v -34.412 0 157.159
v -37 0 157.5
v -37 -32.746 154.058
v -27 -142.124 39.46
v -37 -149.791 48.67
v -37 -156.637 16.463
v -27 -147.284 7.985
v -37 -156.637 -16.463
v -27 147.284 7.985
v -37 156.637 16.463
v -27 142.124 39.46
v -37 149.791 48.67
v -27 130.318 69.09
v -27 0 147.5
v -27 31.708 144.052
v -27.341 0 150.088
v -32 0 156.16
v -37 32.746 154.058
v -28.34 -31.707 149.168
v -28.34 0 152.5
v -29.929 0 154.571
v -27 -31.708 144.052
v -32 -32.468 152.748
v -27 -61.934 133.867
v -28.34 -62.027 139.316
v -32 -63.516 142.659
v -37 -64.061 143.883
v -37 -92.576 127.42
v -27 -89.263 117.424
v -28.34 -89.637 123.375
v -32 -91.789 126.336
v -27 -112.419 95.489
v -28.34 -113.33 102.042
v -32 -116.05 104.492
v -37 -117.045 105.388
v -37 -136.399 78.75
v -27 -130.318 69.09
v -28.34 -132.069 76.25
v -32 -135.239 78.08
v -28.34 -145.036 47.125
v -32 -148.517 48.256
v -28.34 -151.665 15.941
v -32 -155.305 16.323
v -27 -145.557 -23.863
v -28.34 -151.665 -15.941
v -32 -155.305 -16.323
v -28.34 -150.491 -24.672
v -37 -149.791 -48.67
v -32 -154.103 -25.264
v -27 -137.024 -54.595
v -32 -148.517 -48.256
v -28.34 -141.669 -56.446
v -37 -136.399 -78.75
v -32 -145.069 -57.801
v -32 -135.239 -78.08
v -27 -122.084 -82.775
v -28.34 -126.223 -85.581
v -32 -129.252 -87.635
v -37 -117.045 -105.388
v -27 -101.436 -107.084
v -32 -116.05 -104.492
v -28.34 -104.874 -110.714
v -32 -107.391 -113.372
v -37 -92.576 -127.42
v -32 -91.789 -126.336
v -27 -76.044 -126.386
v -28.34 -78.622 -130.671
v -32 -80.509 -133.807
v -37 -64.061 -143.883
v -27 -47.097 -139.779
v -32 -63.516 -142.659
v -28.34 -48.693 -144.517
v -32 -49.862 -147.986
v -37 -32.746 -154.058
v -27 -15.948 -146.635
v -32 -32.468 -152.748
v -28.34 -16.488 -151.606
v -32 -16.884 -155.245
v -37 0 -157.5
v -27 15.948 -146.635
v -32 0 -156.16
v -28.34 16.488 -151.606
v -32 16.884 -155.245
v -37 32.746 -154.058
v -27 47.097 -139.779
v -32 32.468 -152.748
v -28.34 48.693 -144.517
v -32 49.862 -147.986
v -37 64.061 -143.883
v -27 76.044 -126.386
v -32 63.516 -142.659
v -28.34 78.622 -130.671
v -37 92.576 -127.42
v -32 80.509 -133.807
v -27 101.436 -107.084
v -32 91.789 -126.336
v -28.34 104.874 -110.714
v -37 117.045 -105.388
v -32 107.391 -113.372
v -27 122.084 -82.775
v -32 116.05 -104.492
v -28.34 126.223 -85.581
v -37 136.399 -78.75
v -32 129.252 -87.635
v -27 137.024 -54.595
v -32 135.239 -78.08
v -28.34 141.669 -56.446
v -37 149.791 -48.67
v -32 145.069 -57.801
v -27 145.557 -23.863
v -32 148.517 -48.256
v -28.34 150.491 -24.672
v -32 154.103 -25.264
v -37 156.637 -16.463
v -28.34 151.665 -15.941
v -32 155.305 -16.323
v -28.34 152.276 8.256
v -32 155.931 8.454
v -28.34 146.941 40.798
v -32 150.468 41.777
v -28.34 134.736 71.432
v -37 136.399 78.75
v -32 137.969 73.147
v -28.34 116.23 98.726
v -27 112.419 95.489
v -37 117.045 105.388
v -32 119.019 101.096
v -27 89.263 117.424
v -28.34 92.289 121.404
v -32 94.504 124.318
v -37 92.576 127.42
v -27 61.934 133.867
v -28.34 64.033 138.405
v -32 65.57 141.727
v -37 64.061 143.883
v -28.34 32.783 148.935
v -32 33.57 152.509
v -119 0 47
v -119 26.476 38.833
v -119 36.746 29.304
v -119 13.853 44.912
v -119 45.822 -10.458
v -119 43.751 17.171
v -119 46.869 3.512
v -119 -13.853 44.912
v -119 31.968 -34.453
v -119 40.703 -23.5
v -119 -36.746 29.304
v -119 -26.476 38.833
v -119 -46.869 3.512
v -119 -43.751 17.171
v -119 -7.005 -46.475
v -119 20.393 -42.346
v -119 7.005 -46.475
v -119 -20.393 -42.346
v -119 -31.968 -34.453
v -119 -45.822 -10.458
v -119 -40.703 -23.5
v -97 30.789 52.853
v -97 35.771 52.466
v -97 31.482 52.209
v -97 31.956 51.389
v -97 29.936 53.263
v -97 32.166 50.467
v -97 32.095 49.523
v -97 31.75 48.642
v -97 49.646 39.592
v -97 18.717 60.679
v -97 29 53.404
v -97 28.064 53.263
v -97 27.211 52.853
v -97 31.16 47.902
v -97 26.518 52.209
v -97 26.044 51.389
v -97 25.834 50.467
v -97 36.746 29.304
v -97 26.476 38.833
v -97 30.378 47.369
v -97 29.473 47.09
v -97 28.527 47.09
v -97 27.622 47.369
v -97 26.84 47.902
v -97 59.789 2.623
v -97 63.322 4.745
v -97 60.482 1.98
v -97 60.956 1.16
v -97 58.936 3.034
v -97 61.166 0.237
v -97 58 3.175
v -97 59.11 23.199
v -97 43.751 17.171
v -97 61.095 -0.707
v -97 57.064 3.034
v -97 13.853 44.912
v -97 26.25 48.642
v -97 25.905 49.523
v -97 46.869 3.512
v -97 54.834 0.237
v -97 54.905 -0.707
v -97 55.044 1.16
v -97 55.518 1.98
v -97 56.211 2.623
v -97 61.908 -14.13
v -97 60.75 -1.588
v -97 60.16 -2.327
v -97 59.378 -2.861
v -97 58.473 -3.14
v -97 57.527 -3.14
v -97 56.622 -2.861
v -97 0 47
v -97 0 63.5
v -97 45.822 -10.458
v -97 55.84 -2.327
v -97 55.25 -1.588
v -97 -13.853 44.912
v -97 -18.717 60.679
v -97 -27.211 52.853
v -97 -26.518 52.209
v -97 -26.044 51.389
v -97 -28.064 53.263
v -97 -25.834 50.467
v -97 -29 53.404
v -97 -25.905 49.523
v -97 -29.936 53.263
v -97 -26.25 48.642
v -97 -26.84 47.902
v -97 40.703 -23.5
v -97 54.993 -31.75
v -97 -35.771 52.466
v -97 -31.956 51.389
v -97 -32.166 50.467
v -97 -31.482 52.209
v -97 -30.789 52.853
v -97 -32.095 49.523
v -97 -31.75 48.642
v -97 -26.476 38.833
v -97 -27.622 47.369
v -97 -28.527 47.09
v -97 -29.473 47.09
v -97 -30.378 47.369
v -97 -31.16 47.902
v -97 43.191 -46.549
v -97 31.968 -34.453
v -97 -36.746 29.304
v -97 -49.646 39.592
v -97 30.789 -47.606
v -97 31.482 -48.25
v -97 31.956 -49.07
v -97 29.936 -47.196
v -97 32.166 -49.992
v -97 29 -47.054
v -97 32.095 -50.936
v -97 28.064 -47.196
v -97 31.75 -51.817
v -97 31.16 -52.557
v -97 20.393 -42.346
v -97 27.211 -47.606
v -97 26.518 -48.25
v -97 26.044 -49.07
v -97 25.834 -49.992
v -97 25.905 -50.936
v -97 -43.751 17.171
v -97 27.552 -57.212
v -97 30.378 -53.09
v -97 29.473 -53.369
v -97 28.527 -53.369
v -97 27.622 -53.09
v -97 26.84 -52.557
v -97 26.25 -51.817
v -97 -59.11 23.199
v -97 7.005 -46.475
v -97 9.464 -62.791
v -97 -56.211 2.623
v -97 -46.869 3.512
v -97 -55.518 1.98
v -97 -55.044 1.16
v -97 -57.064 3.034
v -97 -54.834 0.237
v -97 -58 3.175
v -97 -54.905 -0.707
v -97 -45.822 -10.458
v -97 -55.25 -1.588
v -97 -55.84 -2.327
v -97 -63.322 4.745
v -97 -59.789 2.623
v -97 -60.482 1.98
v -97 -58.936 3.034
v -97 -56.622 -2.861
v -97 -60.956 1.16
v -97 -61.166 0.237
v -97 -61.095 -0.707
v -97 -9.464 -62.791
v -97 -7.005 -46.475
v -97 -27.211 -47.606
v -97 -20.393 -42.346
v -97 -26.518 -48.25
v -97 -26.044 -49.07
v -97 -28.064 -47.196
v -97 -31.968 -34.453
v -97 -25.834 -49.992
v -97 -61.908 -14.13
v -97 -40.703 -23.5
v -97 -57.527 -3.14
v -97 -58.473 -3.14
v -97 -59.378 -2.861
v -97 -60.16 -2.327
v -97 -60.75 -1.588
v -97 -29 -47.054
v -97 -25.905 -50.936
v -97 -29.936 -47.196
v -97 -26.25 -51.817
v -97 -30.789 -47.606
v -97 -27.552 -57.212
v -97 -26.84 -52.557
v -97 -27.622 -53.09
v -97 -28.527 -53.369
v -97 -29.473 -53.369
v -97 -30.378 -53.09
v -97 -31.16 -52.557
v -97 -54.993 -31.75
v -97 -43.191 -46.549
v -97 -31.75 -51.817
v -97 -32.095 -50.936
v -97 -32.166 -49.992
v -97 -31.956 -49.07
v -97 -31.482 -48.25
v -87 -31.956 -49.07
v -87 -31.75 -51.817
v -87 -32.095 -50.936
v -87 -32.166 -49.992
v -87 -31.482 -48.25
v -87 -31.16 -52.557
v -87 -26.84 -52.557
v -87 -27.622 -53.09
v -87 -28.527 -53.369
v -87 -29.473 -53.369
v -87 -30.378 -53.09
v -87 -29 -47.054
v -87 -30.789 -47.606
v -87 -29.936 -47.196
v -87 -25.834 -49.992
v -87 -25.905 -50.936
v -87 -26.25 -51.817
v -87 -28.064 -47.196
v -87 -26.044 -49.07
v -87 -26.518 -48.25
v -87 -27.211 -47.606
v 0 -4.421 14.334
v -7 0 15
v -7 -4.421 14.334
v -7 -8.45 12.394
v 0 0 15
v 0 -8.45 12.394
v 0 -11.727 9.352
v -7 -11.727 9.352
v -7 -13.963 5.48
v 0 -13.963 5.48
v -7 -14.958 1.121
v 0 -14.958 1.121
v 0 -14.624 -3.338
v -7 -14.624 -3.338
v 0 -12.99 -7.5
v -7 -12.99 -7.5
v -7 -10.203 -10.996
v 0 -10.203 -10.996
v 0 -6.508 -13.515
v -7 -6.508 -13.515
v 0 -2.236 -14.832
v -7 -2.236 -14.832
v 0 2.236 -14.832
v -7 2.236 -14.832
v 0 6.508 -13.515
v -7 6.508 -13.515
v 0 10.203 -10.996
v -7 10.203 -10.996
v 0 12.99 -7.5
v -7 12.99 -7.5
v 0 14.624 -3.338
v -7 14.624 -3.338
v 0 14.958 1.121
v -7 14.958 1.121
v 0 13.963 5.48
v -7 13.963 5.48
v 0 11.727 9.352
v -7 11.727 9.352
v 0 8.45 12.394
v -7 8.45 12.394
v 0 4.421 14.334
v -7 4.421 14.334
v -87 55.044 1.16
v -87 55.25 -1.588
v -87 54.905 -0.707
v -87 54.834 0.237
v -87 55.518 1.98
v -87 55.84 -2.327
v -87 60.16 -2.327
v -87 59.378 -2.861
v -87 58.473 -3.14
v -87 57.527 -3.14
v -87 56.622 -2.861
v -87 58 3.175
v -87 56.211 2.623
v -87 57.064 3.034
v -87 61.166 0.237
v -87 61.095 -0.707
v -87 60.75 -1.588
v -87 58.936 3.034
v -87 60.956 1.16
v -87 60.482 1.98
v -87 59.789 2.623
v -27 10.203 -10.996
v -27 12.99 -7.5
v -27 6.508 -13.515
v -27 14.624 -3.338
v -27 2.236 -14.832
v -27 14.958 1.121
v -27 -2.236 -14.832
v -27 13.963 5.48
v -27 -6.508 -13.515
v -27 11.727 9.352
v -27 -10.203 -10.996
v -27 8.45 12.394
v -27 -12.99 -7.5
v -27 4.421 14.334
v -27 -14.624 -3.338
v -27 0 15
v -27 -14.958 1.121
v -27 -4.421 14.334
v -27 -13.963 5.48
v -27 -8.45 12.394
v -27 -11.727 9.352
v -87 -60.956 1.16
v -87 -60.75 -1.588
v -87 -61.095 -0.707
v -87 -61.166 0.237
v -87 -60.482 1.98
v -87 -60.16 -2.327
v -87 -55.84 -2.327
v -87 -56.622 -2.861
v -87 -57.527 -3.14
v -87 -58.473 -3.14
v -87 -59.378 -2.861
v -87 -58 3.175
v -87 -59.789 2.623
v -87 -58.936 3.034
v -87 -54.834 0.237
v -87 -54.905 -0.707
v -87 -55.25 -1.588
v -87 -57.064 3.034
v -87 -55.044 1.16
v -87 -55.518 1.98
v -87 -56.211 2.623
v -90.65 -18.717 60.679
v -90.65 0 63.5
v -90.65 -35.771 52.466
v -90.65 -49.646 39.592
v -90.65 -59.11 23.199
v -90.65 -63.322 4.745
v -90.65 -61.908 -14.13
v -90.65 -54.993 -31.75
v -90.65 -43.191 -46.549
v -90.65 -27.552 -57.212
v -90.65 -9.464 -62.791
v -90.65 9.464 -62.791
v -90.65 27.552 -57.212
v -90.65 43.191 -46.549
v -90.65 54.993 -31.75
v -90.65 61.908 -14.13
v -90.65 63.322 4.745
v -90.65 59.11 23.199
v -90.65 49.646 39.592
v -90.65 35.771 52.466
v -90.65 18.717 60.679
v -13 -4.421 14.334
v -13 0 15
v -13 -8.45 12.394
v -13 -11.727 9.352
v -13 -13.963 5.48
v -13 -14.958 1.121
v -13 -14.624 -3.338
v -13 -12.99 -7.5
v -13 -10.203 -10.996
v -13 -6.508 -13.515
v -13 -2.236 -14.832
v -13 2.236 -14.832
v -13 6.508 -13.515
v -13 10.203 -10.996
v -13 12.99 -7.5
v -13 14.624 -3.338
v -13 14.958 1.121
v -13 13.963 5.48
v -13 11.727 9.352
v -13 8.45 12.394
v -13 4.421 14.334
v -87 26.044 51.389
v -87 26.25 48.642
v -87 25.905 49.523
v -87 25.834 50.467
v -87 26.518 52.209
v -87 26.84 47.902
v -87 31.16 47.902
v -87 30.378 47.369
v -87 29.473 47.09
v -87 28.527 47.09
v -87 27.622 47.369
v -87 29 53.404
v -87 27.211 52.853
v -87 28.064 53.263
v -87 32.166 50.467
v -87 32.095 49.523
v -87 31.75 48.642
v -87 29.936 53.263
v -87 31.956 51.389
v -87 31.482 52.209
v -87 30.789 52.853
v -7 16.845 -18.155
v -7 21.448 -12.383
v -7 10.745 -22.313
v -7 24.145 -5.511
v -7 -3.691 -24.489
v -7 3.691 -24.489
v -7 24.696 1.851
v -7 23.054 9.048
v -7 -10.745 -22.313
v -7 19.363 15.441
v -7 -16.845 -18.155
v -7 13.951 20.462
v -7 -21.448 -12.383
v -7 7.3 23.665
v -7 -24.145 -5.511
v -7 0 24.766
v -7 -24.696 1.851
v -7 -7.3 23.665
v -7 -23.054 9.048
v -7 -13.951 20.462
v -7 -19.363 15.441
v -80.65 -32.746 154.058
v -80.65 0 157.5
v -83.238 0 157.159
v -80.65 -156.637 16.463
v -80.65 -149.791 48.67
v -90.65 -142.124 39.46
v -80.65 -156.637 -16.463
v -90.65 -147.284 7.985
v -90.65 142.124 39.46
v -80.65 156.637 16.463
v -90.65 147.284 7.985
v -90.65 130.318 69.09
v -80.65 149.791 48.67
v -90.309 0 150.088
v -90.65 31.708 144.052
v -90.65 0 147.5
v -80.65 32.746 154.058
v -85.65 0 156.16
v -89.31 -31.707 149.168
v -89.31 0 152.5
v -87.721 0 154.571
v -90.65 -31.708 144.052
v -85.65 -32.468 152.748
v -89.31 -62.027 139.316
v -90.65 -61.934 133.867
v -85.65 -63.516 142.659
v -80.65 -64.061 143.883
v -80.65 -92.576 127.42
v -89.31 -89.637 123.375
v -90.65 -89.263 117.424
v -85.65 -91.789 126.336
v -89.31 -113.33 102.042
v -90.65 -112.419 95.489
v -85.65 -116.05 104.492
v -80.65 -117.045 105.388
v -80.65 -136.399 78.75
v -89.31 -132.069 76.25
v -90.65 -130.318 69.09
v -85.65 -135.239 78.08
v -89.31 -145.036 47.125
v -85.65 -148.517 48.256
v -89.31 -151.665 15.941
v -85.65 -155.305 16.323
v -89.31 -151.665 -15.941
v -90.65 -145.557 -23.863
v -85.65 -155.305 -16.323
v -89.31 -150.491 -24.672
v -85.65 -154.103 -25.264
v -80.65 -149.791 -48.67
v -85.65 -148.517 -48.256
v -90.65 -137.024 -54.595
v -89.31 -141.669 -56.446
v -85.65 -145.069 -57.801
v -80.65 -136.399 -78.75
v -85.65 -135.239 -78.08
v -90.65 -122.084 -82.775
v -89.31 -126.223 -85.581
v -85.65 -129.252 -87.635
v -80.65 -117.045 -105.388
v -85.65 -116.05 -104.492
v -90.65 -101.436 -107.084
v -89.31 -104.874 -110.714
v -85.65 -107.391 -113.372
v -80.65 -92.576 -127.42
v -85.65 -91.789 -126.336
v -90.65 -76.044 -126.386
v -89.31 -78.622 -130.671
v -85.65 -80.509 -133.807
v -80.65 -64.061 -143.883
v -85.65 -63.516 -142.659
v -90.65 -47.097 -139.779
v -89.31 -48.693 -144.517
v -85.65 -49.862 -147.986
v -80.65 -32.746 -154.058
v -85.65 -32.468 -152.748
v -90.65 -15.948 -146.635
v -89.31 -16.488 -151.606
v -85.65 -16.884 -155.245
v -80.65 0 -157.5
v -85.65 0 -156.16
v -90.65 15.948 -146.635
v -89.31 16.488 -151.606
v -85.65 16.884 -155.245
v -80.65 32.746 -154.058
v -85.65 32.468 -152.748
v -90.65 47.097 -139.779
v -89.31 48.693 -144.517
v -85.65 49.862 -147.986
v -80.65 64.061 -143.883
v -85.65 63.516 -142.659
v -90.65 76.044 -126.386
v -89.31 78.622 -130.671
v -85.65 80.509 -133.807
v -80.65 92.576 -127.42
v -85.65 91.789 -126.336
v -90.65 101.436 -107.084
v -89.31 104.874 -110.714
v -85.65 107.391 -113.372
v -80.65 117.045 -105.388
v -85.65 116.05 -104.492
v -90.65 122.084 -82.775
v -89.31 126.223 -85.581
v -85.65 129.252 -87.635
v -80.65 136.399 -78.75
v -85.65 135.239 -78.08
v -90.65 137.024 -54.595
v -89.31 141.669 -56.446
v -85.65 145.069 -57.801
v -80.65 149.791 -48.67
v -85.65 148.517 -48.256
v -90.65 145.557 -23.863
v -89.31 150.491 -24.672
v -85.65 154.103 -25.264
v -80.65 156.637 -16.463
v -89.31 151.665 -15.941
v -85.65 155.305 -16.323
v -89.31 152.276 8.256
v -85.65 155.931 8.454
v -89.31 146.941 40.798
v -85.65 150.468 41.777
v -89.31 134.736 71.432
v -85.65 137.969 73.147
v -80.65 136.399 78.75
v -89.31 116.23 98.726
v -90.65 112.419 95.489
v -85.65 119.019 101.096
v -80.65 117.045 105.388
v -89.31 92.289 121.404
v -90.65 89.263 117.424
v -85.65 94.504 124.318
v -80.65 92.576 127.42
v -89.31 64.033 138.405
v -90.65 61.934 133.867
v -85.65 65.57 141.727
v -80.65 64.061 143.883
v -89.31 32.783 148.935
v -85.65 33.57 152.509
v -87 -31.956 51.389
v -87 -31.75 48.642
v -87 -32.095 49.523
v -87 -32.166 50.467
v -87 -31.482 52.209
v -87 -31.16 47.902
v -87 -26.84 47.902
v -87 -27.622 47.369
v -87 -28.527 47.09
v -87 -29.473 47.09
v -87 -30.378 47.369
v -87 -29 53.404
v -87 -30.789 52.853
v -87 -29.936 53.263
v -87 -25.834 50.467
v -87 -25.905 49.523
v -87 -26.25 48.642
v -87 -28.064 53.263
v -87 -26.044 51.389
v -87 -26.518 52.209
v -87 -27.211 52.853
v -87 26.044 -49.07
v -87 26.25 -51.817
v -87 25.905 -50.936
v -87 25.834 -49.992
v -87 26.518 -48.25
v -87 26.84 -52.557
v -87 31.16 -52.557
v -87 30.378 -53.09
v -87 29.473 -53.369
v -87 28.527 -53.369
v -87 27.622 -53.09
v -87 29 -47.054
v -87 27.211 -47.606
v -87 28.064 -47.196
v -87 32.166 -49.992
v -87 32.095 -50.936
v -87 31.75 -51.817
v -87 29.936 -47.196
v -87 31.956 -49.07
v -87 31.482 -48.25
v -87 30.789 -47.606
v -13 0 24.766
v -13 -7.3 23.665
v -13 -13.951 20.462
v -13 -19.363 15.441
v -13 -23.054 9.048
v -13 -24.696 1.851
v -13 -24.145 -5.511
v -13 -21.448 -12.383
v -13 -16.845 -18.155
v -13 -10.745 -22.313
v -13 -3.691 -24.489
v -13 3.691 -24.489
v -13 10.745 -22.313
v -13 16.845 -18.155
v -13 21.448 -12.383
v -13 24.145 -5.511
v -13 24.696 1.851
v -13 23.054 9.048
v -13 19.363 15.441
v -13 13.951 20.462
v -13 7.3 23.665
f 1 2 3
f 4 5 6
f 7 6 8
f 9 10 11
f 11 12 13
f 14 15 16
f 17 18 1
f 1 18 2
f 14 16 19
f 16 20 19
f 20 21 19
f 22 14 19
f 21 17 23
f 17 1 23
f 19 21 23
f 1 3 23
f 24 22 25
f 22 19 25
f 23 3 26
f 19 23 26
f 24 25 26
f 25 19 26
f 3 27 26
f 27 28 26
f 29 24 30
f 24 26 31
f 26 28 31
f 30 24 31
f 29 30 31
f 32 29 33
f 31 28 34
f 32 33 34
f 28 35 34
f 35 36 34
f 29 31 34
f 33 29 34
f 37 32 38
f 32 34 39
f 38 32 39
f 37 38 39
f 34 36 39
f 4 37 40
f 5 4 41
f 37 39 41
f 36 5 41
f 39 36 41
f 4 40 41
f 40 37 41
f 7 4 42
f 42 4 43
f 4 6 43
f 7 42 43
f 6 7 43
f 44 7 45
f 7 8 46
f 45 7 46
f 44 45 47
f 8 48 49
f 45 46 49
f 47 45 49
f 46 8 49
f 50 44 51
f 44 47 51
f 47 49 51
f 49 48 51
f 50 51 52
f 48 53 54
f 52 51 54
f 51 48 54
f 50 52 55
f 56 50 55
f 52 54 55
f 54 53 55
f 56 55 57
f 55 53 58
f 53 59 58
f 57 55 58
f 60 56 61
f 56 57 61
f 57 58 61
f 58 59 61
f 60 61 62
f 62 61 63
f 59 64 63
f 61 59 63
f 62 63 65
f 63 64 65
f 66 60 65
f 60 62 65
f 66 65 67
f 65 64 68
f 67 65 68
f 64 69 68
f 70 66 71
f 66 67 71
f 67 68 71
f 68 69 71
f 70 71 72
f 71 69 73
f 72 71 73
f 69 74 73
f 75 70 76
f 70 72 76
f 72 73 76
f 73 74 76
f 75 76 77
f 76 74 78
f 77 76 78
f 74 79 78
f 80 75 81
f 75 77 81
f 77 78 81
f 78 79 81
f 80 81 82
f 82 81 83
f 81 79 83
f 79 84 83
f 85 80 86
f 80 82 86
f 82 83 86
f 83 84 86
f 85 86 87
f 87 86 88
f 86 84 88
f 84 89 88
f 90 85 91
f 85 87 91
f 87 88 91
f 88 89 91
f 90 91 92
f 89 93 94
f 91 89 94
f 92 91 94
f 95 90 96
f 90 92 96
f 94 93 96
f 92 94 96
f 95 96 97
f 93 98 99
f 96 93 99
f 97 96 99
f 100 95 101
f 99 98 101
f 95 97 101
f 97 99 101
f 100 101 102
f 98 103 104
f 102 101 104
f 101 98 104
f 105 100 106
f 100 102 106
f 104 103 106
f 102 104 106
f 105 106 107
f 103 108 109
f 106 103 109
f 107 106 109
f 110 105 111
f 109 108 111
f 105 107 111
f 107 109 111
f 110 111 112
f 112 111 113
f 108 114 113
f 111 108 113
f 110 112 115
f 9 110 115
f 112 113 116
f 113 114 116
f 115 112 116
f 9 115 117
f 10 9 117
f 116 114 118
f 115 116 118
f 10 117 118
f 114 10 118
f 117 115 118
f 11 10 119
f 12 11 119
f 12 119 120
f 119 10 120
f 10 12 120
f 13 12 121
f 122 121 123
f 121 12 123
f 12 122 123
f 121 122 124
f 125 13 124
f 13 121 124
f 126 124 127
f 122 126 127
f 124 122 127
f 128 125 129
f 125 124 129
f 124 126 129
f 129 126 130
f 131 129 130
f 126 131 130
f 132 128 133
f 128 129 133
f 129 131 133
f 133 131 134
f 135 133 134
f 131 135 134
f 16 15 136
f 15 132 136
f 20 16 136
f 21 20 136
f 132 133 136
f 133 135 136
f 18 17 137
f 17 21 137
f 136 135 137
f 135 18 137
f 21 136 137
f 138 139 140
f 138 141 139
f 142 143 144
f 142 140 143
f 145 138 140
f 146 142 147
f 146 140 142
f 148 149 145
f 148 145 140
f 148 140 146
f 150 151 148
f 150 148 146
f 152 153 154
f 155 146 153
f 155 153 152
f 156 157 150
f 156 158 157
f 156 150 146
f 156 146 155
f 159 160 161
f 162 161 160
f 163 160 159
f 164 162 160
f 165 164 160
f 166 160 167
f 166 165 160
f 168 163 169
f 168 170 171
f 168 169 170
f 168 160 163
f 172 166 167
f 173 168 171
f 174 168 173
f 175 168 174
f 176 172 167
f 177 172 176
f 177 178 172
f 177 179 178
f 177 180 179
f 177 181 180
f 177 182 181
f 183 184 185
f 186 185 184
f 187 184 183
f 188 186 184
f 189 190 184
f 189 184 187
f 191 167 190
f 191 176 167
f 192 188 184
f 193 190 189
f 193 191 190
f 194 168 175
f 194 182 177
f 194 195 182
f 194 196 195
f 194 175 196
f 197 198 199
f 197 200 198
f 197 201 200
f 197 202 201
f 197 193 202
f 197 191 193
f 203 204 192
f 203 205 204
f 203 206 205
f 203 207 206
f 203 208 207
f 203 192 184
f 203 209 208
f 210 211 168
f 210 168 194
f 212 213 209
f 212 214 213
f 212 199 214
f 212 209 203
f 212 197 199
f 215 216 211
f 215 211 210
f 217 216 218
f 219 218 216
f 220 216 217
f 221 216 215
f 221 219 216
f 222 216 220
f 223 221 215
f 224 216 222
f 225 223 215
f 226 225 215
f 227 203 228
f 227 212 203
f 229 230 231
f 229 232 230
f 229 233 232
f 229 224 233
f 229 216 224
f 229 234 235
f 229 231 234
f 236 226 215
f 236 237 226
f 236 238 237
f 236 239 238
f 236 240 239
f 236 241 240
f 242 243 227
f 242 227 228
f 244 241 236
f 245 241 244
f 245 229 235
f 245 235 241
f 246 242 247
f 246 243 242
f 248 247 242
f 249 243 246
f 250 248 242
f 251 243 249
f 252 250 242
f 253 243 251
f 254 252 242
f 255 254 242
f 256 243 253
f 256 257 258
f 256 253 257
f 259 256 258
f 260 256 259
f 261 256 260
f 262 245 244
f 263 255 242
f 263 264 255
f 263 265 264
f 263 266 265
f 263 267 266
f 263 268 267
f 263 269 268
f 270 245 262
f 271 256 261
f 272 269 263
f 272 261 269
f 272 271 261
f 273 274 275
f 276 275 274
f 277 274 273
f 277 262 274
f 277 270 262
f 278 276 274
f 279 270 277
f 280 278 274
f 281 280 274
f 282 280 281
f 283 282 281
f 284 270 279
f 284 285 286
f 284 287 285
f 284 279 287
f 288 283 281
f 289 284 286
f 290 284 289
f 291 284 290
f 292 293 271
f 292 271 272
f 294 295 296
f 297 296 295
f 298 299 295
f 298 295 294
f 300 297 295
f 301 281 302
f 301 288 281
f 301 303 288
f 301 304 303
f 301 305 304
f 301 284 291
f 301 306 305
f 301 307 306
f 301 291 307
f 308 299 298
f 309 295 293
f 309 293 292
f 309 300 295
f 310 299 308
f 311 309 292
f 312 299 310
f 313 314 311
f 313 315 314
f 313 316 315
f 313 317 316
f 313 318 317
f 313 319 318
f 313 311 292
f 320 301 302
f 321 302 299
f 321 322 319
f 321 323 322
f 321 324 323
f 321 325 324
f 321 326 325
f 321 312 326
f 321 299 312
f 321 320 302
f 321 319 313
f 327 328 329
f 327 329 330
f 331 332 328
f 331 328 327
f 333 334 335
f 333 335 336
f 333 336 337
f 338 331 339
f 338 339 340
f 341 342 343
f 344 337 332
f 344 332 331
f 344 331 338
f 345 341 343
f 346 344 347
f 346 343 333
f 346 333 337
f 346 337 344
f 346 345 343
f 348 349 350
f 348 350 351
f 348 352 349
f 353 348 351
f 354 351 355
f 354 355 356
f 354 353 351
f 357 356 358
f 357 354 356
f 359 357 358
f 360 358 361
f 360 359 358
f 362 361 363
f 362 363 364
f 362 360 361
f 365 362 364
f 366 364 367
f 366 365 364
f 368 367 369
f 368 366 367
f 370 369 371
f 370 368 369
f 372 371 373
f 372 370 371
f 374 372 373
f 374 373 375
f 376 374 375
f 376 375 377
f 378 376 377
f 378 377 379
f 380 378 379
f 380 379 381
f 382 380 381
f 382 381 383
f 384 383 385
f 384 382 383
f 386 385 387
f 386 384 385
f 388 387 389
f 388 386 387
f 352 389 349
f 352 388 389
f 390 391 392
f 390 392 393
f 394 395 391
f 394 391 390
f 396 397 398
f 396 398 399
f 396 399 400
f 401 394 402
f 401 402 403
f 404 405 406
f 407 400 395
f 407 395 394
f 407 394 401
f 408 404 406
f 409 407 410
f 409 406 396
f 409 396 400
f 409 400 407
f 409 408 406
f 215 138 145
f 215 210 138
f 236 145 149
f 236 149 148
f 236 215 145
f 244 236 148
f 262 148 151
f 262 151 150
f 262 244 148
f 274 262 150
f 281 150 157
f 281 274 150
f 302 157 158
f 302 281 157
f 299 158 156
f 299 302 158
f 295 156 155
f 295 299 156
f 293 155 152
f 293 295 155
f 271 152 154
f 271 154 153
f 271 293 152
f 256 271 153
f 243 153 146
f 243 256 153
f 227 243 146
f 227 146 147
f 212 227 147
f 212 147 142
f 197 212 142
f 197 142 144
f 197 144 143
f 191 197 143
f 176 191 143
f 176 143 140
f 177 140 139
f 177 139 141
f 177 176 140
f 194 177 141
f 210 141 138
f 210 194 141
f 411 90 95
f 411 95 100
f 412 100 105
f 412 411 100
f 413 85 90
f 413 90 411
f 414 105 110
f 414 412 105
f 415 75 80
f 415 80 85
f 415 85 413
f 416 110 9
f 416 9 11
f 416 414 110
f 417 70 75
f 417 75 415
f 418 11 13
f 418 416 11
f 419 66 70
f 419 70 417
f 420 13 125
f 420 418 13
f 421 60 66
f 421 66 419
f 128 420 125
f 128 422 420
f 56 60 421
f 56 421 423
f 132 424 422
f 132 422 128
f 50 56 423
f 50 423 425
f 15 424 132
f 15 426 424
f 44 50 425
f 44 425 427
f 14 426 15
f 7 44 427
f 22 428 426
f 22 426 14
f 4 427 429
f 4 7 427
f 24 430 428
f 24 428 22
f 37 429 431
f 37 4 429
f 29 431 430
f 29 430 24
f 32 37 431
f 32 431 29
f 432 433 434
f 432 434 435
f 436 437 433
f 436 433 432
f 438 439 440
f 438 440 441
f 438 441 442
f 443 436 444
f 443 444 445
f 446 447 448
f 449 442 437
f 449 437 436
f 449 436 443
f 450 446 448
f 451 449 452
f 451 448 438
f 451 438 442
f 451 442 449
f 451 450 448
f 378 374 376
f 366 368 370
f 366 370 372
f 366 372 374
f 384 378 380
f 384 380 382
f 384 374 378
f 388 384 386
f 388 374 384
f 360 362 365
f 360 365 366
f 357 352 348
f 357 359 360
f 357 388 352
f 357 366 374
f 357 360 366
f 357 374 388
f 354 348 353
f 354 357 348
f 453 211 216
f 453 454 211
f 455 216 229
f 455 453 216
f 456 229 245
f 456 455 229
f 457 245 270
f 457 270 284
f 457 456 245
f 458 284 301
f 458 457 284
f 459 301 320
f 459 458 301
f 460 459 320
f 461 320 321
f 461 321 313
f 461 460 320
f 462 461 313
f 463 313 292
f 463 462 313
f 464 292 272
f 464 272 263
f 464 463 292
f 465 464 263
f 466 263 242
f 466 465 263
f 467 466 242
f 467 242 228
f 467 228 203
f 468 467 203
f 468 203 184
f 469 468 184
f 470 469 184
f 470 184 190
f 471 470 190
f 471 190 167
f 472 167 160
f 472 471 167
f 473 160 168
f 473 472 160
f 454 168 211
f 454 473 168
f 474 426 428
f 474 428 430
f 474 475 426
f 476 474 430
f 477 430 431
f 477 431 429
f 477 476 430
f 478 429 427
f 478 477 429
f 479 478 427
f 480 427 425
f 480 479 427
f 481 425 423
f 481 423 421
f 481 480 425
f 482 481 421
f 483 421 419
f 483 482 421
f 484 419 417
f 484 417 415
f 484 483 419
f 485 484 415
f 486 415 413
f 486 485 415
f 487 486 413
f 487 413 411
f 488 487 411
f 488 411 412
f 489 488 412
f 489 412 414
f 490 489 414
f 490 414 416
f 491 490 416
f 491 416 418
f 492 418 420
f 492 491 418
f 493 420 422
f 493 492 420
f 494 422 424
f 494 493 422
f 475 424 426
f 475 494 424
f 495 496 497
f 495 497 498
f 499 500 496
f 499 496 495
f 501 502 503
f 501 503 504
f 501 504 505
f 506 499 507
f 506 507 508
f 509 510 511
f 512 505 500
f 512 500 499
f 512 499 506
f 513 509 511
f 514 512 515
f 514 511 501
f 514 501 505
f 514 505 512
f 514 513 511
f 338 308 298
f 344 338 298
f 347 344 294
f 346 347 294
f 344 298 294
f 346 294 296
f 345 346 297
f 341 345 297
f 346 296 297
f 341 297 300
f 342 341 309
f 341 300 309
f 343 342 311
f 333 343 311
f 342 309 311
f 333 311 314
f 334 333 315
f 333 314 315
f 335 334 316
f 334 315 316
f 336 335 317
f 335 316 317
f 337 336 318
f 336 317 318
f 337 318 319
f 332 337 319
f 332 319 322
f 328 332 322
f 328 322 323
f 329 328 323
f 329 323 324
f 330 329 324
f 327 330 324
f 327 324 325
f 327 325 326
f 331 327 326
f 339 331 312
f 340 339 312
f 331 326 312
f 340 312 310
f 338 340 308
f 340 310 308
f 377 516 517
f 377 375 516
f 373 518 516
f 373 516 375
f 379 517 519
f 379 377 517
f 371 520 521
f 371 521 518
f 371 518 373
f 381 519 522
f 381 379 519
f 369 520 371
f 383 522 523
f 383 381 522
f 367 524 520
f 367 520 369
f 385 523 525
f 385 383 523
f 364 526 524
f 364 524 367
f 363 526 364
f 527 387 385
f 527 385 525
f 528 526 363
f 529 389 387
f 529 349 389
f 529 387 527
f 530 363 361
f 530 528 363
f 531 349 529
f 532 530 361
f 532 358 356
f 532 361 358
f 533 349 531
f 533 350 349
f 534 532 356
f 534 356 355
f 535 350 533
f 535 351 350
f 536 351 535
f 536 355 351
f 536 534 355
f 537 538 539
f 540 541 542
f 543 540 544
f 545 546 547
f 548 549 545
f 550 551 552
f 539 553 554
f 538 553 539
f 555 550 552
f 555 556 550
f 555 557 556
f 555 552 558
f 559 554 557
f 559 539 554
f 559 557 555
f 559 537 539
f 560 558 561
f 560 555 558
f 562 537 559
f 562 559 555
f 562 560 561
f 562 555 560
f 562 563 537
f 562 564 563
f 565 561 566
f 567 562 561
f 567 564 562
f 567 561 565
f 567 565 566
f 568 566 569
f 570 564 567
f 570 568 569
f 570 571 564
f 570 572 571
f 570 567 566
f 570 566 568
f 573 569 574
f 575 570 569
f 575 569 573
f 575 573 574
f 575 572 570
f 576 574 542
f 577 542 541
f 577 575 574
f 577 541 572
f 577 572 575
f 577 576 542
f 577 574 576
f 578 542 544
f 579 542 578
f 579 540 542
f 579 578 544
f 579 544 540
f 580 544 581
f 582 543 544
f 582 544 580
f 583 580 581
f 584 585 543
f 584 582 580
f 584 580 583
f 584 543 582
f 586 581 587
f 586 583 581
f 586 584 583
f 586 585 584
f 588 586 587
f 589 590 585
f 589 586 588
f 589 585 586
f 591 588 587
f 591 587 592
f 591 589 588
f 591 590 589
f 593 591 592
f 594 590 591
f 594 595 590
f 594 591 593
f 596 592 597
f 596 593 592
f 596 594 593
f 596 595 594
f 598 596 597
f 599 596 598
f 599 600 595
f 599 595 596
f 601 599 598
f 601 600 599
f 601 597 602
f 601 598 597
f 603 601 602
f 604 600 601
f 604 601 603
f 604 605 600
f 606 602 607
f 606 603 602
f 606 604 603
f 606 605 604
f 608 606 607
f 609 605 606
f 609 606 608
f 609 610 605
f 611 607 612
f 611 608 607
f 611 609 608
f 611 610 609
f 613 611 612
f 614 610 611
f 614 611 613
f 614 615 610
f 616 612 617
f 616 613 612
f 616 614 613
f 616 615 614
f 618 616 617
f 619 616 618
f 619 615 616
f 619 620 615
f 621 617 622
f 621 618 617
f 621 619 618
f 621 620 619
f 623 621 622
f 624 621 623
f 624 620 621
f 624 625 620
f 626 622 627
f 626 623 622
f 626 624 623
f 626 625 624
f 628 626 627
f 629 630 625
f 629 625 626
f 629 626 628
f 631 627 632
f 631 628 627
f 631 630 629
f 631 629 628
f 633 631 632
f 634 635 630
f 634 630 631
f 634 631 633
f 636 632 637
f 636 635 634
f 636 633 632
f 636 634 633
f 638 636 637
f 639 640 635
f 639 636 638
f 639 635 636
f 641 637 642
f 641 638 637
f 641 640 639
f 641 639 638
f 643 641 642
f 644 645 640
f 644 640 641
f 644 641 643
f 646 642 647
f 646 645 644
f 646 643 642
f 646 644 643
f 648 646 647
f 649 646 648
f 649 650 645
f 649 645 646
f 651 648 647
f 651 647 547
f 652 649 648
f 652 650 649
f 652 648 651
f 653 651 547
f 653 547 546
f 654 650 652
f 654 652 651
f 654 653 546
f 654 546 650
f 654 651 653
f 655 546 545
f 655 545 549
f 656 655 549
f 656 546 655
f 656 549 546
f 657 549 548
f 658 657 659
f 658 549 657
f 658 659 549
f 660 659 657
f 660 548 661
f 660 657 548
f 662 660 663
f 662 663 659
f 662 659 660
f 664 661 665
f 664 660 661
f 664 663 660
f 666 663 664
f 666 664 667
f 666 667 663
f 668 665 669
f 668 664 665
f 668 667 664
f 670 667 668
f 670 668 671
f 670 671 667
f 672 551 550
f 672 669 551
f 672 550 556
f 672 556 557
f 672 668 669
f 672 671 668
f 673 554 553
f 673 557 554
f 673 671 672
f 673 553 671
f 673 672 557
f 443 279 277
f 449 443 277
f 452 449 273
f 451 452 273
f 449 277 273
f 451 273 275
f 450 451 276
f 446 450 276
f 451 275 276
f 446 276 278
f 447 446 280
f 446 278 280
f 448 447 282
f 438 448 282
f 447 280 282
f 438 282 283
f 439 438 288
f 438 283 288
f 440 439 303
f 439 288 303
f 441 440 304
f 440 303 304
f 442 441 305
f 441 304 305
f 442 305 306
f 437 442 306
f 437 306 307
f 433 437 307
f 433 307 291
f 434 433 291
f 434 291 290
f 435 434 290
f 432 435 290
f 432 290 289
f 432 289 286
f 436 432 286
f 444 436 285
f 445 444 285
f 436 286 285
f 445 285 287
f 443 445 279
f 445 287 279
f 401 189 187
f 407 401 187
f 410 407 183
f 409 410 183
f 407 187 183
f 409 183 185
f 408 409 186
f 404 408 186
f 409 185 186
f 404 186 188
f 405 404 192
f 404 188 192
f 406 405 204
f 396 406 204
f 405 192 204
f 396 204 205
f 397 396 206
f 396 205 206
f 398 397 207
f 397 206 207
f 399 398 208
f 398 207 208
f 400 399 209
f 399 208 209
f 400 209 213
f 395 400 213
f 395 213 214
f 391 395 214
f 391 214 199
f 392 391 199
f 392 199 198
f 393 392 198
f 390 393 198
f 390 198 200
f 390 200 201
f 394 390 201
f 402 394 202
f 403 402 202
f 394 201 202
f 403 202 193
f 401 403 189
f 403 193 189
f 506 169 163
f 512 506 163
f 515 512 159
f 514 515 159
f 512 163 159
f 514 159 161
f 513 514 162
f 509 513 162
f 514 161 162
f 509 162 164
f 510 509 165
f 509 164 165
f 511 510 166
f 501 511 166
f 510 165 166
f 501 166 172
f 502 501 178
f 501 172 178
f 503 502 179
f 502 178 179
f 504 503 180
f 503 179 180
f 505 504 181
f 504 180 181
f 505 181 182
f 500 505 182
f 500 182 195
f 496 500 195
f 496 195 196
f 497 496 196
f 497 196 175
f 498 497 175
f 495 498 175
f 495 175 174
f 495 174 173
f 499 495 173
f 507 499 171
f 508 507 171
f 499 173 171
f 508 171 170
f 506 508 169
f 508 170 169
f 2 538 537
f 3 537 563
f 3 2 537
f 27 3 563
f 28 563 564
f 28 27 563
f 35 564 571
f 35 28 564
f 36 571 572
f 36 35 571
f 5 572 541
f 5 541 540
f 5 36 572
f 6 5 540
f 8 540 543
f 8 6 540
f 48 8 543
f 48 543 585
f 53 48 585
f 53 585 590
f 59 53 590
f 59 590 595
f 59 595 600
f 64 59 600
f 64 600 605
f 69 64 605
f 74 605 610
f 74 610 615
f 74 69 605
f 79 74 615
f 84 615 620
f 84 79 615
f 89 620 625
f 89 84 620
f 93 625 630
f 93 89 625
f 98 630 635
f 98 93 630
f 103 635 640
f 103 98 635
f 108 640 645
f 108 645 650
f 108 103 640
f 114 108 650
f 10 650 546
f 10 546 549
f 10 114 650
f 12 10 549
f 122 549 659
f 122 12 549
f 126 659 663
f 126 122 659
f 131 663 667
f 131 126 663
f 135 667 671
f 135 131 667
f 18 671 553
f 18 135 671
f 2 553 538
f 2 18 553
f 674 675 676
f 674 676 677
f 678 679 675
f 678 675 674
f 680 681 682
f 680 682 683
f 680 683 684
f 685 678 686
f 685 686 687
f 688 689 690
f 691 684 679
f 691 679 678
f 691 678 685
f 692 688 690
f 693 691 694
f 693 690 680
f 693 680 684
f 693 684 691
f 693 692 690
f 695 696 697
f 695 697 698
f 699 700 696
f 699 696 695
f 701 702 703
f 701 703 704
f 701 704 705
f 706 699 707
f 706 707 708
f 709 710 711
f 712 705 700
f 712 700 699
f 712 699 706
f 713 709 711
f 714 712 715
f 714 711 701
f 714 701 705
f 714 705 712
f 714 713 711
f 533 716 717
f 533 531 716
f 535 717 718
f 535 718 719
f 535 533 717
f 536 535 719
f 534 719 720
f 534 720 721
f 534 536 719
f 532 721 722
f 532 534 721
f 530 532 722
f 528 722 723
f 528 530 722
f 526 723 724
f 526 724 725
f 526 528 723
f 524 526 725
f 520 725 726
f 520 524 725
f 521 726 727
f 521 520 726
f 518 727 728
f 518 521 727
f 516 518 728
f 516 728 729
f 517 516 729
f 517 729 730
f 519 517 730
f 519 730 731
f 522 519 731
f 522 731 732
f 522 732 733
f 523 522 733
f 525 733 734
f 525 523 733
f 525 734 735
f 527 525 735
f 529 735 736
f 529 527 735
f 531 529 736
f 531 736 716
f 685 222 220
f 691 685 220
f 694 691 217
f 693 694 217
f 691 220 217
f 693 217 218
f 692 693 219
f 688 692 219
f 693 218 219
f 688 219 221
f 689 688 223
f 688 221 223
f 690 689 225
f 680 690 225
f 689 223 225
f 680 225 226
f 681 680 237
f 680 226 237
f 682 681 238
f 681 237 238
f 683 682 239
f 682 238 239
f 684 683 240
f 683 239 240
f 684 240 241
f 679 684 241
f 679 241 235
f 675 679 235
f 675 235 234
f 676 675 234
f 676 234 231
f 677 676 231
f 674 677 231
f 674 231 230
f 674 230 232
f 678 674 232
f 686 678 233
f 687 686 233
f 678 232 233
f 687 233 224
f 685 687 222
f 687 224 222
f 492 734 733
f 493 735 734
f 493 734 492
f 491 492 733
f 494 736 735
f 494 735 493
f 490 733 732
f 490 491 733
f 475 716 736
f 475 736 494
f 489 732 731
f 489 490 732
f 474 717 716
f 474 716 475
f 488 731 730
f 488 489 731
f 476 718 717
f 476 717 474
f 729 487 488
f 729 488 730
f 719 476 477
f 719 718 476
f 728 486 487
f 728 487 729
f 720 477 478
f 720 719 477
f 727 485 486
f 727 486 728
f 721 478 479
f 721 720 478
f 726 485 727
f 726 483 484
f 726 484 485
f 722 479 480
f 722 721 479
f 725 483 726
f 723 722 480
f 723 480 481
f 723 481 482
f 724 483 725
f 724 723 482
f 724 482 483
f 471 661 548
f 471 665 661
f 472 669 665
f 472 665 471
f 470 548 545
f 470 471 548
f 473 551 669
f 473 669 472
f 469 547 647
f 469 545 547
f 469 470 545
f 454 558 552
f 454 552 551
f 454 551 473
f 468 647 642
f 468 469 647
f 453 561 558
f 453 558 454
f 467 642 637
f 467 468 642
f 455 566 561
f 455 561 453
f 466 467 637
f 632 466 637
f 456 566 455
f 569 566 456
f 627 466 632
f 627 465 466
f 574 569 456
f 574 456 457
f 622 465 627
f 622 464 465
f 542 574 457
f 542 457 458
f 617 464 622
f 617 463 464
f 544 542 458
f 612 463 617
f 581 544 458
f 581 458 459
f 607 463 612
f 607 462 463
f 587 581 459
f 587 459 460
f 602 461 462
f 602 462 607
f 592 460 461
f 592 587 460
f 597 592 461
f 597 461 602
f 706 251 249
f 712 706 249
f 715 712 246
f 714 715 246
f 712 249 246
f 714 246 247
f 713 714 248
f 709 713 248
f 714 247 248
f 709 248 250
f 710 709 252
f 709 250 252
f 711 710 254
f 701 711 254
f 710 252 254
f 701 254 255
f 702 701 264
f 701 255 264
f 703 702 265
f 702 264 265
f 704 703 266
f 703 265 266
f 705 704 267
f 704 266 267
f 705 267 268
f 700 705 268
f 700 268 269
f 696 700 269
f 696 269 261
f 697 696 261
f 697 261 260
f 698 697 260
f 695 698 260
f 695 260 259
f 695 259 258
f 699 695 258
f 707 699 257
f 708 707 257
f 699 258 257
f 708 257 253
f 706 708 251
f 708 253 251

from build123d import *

# Parameters (mm, degrees)
FILLET1_R          = 10
SKETCH2_R          = 3.175
CUT_EXTRUDE1_DEPTH = 10


with BuildPart() as part:
    # Sketch1 → Revolve1 (revolve)
    with BuildSketch(Plane(origin=(0, 0, 0), x_dir=(1, 0, 0), z_dir=(0, 1, 0)), mode=Mode.PRIVATE) as revolve1_sk:
        Polygon((-27, 157.5), (-27, 15), (-13, 15), (-13, 24.765749007), (-7, 24.765749007), (-7, 15), (0, 15), (0, 0), (-119, 0), (-119, 47), (-97, 47), (-97, 63.5), (-90.65, 63.5), (-90.65, 157.5), align=None)
    revolve(revolve1_sk.sketch.rotate(Axis((-119, 0, 0), (1, 0, 0)), 180), axis=Axis((-119, 0, 0), (1, 0, 0)))

    # Fillet1
    fillet1_edges = [part.edges().sort_by_distance(p)[0] for p in [
        (-27, 0, -157.5),
        (-90.65, 0, -157.5),
    ]]
    fillet(fillet1_edges, radius=FILLET1_R)

    # Sketch2 → Cut-Extrude1 (cut)
    with BuildSketch(Plane.ZY.offset(97)):
        with Locations((0, 58)):
            Circle(SKETCH2_R)
        with Locations((50.229473419, 29)):
            Circle(SKETCH2_R)
        with Locations((50.229473419, -29)):
            Circle(SKETCH2_R)
        with Locations((0, -58)):
            Circle(SKETCH2_R)
        with Locations((-50.22947342, -29)):
            Circle(SKETCH2_R)
        with Locations((-50.229473419, 29)):
            Circle(SKETCH2_R)
    extrude(amount=-CUT_EXTRUDE1_DEPTH, mode=Mode.SUBTRACT)


solid = part.part
